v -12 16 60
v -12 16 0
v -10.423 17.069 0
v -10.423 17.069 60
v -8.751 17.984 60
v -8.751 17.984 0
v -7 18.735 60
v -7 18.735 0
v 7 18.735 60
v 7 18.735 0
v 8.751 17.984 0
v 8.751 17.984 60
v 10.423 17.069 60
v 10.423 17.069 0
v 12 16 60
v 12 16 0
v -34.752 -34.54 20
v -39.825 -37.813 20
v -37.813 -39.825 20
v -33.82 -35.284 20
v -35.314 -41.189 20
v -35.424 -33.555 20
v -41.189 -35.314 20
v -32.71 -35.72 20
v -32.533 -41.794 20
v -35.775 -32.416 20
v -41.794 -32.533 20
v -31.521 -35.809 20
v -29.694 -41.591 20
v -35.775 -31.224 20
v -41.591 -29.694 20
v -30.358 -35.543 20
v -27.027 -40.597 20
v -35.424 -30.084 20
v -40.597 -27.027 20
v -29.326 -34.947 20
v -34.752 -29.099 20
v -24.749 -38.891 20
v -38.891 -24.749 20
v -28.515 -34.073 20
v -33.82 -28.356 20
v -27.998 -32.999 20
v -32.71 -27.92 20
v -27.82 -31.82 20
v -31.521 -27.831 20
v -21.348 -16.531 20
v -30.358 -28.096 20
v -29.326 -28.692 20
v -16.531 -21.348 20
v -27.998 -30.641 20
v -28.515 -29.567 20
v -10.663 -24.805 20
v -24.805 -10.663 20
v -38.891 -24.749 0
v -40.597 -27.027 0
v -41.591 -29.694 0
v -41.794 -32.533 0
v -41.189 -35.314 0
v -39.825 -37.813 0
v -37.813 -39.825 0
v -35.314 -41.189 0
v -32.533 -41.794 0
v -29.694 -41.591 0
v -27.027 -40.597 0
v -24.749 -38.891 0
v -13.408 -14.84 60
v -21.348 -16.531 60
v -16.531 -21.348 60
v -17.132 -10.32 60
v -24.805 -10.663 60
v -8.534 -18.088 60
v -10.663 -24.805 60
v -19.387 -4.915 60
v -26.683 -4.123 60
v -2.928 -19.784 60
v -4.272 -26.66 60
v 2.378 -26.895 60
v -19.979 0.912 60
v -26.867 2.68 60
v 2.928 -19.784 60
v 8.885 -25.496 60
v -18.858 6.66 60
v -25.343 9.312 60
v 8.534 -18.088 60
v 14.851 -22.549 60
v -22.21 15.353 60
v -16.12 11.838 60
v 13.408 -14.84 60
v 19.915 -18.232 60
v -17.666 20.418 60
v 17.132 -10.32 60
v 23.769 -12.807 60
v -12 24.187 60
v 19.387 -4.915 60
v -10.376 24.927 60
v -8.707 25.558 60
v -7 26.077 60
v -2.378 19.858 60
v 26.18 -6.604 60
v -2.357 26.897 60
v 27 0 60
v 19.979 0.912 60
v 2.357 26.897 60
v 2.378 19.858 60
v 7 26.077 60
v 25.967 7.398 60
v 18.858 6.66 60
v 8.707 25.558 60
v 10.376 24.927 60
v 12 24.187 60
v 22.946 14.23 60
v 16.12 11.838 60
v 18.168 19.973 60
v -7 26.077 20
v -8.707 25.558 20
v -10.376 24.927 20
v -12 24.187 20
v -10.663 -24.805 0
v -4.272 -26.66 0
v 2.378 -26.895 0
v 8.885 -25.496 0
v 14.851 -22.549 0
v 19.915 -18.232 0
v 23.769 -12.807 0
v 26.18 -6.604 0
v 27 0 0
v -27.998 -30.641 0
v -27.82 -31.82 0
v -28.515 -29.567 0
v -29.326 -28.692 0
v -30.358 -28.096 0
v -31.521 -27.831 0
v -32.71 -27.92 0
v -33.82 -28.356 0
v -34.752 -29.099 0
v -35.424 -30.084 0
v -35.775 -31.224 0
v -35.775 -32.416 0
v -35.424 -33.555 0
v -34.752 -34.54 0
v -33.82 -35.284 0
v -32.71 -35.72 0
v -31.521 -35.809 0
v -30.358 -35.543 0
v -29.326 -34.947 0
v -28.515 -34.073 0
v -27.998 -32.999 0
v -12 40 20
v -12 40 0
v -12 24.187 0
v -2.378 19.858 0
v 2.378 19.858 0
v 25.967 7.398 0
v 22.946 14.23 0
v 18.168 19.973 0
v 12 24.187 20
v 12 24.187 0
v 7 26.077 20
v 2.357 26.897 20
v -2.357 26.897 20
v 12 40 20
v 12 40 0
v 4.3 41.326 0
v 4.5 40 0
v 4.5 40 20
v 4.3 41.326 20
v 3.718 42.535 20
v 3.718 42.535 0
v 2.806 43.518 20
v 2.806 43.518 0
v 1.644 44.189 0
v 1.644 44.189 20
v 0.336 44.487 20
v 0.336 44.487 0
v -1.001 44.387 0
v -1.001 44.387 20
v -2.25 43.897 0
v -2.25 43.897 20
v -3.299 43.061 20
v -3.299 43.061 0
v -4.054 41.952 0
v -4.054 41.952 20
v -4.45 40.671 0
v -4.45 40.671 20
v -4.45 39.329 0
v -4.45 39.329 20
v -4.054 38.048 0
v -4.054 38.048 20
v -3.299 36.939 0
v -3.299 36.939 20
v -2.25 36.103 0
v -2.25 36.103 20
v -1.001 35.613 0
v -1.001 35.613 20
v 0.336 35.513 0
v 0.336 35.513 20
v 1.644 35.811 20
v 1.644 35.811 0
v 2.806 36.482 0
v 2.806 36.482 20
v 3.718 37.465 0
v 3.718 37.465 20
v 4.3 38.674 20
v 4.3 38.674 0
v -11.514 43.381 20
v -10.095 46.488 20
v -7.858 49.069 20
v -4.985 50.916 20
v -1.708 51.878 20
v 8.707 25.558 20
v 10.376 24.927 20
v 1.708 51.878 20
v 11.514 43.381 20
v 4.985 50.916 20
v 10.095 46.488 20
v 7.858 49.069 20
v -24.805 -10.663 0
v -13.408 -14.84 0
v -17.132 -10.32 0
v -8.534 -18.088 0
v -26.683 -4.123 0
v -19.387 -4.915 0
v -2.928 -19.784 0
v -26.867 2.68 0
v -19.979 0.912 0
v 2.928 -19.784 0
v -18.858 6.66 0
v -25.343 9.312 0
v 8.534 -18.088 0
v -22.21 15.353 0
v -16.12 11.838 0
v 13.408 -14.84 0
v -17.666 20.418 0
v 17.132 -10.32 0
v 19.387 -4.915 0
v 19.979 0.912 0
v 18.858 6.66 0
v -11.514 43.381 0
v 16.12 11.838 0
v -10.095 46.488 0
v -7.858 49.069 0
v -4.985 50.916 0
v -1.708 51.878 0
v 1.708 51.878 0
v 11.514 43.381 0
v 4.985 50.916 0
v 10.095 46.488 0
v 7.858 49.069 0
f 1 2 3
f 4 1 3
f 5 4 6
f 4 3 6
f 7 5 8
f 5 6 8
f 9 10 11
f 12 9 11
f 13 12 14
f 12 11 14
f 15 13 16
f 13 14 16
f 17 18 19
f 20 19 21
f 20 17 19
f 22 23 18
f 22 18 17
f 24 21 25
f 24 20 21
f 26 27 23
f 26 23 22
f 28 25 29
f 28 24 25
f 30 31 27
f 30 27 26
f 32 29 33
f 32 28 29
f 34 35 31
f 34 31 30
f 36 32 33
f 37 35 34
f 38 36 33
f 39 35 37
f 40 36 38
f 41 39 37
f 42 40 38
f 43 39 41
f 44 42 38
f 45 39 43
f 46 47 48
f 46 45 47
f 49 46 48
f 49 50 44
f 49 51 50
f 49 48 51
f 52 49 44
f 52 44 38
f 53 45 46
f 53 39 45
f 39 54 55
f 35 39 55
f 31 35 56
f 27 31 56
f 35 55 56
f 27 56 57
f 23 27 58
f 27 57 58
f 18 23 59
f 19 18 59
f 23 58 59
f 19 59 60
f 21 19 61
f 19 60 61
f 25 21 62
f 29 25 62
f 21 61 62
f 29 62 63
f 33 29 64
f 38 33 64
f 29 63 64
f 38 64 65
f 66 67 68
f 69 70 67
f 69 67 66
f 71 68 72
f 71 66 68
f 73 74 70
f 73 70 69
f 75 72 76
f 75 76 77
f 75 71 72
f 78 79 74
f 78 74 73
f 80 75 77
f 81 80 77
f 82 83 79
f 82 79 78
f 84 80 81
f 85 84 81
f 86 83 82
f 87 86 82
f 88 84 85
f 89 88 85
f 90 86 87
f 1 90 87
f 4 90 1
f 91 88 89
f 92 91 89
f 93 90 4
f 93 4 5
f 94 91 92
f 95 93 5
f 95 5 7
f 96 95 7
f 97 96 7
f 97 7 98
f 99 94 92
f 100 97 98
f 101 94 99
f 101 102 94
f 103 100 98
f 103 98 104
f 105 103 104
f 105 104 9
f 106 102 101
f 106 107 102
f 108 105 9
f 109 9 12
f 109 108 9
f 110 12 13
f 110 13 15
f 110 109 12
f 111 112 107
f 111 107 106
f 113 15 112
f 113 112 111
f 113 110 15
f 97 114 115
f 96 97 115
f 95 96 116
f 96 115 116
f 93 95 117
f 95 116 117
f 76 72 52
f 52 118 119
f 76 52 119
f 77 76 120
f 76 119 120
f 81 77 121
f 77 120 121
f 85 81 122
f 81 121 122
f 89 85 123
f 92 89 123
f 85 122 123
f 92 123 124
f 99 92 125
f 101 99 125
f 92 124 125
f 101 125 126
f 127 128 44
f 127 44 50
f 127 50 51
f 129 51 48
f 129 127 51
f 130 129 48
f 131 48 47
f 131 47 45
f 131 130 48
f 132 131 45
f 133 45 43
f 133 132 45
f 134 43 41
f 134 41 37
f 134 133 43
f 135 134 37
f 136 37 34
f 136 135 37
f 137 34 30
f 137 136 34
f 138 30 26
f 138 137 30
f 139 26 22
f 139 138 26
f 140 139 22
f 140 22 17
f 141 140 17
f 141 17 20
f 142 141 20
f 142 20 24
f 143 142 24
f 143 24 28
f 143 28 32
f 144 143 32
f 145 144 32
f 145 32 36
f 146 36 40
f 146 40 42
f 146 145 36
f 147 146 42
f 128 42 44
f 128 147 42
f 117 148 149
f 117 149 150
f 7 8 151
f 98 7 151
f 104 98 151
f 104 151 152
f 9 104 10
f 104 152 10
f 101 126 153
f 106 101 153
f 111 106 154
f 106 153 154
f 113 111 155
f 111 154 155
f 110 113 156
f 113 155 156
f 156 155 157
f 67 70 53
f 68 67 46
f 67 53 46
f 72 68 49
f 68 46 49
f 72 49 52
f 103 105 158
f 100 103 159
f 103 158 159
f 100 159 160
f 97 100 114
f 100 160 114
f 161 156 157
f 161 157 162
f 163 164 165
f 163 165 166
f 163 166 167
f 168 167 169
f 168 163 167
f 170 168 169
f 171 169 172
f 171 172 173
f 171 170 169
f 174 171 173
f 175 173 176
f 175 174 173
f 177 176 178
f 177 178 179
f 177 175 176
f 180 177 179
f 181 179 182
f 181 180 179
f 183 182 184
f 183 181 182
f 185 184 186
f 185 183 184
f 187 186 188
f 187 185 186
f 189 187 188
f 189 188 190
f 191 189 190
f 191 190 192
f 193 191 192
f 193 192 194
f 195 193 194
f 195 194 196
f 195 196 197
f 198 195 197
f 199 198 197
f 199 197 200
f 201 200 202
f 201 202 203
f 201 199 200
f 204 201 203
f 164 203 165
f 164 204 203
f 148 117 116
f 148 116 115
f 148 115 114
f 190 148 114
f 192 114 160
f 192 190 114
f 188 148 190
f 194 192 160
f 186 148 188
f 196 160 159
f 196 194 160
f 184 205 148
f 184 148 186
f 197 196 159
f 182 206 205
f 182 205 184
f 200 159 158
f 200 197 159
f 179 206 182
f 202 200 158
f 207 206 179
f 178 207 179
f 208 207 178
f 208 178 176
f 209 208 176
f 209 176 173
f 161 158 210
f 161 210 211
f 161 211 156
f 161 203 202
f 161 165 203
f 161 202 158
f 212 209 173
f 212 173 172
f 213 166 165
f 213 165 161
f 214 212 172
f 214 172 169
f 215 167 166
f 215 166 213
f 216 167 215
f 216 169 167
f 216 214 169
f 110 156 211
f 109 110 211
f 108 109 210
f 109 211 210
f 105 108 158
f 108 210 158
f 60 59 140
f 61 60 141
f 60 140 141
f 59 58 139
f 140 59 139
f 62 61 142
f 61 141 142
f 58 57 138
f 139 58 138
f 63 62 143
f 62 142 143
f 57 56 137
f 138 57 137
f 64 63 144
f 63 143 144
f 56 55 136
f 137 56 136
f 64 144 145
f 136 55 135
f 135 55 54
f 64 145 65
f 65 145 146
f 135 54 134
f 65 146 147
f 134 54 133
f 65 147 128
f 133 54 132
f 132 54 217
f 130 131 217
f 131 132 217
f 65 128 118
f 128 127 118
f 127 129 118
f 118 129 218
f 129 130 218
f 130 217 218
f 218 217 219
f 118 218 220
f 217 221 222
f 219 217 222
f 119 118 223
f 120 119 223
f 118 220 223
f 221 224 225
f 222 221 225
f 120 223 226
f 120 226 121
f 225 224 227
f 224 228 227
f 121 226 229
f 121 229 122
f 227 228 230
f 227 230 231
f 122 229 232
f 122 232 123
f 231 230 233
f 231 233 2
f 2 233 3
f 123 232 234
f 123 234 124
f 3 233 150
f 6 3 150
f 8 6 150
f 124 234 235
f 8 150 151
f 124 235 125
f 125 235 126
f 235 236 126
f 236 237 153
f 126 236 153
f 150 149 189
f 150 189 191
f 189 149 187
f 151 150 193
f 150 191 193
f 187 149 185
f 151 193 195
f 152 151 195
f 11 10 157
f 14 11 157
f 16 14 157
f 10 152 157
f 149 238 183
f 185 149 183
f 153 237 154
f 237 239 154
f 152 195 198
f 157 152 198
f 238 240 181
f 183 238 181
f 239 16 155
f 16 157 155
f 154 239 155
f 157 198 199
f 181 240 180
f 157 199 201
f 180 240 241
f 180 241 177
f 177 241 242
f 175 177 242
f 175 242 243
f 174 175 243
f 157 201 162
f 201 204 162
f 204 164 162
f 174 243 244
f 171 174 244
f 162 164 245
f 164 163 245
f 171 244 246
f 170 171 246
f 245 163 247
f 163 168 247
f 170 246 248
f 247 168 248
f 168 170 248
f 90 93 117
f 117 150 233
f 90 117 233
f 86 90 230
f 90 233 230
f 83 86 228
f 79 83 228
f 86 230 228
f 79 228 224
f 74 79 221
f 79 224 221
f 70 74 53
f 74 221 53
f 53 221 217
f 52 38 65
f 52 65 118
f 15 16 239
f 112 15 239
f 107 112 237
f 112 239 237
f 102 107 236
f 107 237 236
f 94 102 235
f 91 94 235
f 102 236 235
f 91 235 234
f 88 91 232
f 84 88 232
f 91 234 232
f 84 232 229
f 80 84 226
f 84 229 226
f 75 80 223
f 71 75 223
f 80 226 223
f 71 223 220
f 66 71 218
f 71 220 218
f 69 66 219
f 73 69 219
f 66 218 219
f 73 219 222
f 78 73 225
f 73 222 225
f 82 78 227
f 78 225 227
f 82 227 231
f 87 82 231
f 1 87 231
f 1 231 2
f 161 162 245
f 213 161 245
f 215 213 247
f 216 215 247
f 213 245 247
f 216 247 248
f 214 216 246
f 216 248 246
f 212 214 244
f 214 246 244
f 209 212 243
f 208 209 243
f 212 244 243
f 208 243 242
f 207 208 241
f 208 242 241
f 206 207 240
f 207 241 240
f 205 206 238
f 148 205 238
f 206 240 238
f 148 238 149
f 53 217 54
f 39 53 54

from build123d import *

# Parameters (mm, degrees)
SKETCH_1_R      = 27
SKETCH_1_R_2    = 20
EXTRUDE_1_DEPTH = 60
SKETCH_1_5_R    = 4.5
SKETCH_1_5_R_2  = 4
EXTRUDE_2_DEPTH = 20


with BuildPart() as part:
    # Эскиз1 → Бобышка-Вытянуть1 (new body)
    with BuildSketch(Plane.XY):
        Circle(SKETCH_1_R)
        Circle(SKETCH_1_R_2, mode=Mode.SUBTRACT)
    extrude(amount=EXTRUDE_1_DEPTH)

    # Эскиз1<5> → Бобышка-Вытянуть2 (add)
    # profile 1 of 2: a face of its own
    with BuildSketch(Plane.XY):
        with BuildLine():
            ThreePointArc((-12, 24.186773245), (0, 27), (12, 24.186773245))
            Line((12, 24.186773245), (12, 40))
            ThreePointArc((12, 40), (0, 52), (-12, 40))
            Line((-12, 40), (-12, 24.186773245))
        make_face()
        with Locations((0, 40)):
            Circle(SKETCH_1_5_R, mode=Mode.SUBTRACT)
    # profile 2 of 2: a face of its own
    with BuildSketch(Plane.XY):
        with BuildLine():
            ThreePointArc((-10.663080039, -24.805215663), (-19.091883092, -19.091883092), (-24.805215663, -10.663080039))
            Line((-24.805215663, -10.663080039), (-38.890872965, -24.748737342))
            ThreePointArc((-38.890872965, -24.748737342), (-38.890872965, -38.890872965), (-24.748737342, -38.890872965))
            Line((-24.748737342, -38.890872965), (-10.663080039, -24.805215663))
        make_face()
        with Locations((-31.819805153, -31.819805153)):
            Circle(SKETCH_1_5_R_2, mode=Mode.SUBTRACT)
    extrude(amount=EXTRUDE_2_DEPTH)


solid = part.part
